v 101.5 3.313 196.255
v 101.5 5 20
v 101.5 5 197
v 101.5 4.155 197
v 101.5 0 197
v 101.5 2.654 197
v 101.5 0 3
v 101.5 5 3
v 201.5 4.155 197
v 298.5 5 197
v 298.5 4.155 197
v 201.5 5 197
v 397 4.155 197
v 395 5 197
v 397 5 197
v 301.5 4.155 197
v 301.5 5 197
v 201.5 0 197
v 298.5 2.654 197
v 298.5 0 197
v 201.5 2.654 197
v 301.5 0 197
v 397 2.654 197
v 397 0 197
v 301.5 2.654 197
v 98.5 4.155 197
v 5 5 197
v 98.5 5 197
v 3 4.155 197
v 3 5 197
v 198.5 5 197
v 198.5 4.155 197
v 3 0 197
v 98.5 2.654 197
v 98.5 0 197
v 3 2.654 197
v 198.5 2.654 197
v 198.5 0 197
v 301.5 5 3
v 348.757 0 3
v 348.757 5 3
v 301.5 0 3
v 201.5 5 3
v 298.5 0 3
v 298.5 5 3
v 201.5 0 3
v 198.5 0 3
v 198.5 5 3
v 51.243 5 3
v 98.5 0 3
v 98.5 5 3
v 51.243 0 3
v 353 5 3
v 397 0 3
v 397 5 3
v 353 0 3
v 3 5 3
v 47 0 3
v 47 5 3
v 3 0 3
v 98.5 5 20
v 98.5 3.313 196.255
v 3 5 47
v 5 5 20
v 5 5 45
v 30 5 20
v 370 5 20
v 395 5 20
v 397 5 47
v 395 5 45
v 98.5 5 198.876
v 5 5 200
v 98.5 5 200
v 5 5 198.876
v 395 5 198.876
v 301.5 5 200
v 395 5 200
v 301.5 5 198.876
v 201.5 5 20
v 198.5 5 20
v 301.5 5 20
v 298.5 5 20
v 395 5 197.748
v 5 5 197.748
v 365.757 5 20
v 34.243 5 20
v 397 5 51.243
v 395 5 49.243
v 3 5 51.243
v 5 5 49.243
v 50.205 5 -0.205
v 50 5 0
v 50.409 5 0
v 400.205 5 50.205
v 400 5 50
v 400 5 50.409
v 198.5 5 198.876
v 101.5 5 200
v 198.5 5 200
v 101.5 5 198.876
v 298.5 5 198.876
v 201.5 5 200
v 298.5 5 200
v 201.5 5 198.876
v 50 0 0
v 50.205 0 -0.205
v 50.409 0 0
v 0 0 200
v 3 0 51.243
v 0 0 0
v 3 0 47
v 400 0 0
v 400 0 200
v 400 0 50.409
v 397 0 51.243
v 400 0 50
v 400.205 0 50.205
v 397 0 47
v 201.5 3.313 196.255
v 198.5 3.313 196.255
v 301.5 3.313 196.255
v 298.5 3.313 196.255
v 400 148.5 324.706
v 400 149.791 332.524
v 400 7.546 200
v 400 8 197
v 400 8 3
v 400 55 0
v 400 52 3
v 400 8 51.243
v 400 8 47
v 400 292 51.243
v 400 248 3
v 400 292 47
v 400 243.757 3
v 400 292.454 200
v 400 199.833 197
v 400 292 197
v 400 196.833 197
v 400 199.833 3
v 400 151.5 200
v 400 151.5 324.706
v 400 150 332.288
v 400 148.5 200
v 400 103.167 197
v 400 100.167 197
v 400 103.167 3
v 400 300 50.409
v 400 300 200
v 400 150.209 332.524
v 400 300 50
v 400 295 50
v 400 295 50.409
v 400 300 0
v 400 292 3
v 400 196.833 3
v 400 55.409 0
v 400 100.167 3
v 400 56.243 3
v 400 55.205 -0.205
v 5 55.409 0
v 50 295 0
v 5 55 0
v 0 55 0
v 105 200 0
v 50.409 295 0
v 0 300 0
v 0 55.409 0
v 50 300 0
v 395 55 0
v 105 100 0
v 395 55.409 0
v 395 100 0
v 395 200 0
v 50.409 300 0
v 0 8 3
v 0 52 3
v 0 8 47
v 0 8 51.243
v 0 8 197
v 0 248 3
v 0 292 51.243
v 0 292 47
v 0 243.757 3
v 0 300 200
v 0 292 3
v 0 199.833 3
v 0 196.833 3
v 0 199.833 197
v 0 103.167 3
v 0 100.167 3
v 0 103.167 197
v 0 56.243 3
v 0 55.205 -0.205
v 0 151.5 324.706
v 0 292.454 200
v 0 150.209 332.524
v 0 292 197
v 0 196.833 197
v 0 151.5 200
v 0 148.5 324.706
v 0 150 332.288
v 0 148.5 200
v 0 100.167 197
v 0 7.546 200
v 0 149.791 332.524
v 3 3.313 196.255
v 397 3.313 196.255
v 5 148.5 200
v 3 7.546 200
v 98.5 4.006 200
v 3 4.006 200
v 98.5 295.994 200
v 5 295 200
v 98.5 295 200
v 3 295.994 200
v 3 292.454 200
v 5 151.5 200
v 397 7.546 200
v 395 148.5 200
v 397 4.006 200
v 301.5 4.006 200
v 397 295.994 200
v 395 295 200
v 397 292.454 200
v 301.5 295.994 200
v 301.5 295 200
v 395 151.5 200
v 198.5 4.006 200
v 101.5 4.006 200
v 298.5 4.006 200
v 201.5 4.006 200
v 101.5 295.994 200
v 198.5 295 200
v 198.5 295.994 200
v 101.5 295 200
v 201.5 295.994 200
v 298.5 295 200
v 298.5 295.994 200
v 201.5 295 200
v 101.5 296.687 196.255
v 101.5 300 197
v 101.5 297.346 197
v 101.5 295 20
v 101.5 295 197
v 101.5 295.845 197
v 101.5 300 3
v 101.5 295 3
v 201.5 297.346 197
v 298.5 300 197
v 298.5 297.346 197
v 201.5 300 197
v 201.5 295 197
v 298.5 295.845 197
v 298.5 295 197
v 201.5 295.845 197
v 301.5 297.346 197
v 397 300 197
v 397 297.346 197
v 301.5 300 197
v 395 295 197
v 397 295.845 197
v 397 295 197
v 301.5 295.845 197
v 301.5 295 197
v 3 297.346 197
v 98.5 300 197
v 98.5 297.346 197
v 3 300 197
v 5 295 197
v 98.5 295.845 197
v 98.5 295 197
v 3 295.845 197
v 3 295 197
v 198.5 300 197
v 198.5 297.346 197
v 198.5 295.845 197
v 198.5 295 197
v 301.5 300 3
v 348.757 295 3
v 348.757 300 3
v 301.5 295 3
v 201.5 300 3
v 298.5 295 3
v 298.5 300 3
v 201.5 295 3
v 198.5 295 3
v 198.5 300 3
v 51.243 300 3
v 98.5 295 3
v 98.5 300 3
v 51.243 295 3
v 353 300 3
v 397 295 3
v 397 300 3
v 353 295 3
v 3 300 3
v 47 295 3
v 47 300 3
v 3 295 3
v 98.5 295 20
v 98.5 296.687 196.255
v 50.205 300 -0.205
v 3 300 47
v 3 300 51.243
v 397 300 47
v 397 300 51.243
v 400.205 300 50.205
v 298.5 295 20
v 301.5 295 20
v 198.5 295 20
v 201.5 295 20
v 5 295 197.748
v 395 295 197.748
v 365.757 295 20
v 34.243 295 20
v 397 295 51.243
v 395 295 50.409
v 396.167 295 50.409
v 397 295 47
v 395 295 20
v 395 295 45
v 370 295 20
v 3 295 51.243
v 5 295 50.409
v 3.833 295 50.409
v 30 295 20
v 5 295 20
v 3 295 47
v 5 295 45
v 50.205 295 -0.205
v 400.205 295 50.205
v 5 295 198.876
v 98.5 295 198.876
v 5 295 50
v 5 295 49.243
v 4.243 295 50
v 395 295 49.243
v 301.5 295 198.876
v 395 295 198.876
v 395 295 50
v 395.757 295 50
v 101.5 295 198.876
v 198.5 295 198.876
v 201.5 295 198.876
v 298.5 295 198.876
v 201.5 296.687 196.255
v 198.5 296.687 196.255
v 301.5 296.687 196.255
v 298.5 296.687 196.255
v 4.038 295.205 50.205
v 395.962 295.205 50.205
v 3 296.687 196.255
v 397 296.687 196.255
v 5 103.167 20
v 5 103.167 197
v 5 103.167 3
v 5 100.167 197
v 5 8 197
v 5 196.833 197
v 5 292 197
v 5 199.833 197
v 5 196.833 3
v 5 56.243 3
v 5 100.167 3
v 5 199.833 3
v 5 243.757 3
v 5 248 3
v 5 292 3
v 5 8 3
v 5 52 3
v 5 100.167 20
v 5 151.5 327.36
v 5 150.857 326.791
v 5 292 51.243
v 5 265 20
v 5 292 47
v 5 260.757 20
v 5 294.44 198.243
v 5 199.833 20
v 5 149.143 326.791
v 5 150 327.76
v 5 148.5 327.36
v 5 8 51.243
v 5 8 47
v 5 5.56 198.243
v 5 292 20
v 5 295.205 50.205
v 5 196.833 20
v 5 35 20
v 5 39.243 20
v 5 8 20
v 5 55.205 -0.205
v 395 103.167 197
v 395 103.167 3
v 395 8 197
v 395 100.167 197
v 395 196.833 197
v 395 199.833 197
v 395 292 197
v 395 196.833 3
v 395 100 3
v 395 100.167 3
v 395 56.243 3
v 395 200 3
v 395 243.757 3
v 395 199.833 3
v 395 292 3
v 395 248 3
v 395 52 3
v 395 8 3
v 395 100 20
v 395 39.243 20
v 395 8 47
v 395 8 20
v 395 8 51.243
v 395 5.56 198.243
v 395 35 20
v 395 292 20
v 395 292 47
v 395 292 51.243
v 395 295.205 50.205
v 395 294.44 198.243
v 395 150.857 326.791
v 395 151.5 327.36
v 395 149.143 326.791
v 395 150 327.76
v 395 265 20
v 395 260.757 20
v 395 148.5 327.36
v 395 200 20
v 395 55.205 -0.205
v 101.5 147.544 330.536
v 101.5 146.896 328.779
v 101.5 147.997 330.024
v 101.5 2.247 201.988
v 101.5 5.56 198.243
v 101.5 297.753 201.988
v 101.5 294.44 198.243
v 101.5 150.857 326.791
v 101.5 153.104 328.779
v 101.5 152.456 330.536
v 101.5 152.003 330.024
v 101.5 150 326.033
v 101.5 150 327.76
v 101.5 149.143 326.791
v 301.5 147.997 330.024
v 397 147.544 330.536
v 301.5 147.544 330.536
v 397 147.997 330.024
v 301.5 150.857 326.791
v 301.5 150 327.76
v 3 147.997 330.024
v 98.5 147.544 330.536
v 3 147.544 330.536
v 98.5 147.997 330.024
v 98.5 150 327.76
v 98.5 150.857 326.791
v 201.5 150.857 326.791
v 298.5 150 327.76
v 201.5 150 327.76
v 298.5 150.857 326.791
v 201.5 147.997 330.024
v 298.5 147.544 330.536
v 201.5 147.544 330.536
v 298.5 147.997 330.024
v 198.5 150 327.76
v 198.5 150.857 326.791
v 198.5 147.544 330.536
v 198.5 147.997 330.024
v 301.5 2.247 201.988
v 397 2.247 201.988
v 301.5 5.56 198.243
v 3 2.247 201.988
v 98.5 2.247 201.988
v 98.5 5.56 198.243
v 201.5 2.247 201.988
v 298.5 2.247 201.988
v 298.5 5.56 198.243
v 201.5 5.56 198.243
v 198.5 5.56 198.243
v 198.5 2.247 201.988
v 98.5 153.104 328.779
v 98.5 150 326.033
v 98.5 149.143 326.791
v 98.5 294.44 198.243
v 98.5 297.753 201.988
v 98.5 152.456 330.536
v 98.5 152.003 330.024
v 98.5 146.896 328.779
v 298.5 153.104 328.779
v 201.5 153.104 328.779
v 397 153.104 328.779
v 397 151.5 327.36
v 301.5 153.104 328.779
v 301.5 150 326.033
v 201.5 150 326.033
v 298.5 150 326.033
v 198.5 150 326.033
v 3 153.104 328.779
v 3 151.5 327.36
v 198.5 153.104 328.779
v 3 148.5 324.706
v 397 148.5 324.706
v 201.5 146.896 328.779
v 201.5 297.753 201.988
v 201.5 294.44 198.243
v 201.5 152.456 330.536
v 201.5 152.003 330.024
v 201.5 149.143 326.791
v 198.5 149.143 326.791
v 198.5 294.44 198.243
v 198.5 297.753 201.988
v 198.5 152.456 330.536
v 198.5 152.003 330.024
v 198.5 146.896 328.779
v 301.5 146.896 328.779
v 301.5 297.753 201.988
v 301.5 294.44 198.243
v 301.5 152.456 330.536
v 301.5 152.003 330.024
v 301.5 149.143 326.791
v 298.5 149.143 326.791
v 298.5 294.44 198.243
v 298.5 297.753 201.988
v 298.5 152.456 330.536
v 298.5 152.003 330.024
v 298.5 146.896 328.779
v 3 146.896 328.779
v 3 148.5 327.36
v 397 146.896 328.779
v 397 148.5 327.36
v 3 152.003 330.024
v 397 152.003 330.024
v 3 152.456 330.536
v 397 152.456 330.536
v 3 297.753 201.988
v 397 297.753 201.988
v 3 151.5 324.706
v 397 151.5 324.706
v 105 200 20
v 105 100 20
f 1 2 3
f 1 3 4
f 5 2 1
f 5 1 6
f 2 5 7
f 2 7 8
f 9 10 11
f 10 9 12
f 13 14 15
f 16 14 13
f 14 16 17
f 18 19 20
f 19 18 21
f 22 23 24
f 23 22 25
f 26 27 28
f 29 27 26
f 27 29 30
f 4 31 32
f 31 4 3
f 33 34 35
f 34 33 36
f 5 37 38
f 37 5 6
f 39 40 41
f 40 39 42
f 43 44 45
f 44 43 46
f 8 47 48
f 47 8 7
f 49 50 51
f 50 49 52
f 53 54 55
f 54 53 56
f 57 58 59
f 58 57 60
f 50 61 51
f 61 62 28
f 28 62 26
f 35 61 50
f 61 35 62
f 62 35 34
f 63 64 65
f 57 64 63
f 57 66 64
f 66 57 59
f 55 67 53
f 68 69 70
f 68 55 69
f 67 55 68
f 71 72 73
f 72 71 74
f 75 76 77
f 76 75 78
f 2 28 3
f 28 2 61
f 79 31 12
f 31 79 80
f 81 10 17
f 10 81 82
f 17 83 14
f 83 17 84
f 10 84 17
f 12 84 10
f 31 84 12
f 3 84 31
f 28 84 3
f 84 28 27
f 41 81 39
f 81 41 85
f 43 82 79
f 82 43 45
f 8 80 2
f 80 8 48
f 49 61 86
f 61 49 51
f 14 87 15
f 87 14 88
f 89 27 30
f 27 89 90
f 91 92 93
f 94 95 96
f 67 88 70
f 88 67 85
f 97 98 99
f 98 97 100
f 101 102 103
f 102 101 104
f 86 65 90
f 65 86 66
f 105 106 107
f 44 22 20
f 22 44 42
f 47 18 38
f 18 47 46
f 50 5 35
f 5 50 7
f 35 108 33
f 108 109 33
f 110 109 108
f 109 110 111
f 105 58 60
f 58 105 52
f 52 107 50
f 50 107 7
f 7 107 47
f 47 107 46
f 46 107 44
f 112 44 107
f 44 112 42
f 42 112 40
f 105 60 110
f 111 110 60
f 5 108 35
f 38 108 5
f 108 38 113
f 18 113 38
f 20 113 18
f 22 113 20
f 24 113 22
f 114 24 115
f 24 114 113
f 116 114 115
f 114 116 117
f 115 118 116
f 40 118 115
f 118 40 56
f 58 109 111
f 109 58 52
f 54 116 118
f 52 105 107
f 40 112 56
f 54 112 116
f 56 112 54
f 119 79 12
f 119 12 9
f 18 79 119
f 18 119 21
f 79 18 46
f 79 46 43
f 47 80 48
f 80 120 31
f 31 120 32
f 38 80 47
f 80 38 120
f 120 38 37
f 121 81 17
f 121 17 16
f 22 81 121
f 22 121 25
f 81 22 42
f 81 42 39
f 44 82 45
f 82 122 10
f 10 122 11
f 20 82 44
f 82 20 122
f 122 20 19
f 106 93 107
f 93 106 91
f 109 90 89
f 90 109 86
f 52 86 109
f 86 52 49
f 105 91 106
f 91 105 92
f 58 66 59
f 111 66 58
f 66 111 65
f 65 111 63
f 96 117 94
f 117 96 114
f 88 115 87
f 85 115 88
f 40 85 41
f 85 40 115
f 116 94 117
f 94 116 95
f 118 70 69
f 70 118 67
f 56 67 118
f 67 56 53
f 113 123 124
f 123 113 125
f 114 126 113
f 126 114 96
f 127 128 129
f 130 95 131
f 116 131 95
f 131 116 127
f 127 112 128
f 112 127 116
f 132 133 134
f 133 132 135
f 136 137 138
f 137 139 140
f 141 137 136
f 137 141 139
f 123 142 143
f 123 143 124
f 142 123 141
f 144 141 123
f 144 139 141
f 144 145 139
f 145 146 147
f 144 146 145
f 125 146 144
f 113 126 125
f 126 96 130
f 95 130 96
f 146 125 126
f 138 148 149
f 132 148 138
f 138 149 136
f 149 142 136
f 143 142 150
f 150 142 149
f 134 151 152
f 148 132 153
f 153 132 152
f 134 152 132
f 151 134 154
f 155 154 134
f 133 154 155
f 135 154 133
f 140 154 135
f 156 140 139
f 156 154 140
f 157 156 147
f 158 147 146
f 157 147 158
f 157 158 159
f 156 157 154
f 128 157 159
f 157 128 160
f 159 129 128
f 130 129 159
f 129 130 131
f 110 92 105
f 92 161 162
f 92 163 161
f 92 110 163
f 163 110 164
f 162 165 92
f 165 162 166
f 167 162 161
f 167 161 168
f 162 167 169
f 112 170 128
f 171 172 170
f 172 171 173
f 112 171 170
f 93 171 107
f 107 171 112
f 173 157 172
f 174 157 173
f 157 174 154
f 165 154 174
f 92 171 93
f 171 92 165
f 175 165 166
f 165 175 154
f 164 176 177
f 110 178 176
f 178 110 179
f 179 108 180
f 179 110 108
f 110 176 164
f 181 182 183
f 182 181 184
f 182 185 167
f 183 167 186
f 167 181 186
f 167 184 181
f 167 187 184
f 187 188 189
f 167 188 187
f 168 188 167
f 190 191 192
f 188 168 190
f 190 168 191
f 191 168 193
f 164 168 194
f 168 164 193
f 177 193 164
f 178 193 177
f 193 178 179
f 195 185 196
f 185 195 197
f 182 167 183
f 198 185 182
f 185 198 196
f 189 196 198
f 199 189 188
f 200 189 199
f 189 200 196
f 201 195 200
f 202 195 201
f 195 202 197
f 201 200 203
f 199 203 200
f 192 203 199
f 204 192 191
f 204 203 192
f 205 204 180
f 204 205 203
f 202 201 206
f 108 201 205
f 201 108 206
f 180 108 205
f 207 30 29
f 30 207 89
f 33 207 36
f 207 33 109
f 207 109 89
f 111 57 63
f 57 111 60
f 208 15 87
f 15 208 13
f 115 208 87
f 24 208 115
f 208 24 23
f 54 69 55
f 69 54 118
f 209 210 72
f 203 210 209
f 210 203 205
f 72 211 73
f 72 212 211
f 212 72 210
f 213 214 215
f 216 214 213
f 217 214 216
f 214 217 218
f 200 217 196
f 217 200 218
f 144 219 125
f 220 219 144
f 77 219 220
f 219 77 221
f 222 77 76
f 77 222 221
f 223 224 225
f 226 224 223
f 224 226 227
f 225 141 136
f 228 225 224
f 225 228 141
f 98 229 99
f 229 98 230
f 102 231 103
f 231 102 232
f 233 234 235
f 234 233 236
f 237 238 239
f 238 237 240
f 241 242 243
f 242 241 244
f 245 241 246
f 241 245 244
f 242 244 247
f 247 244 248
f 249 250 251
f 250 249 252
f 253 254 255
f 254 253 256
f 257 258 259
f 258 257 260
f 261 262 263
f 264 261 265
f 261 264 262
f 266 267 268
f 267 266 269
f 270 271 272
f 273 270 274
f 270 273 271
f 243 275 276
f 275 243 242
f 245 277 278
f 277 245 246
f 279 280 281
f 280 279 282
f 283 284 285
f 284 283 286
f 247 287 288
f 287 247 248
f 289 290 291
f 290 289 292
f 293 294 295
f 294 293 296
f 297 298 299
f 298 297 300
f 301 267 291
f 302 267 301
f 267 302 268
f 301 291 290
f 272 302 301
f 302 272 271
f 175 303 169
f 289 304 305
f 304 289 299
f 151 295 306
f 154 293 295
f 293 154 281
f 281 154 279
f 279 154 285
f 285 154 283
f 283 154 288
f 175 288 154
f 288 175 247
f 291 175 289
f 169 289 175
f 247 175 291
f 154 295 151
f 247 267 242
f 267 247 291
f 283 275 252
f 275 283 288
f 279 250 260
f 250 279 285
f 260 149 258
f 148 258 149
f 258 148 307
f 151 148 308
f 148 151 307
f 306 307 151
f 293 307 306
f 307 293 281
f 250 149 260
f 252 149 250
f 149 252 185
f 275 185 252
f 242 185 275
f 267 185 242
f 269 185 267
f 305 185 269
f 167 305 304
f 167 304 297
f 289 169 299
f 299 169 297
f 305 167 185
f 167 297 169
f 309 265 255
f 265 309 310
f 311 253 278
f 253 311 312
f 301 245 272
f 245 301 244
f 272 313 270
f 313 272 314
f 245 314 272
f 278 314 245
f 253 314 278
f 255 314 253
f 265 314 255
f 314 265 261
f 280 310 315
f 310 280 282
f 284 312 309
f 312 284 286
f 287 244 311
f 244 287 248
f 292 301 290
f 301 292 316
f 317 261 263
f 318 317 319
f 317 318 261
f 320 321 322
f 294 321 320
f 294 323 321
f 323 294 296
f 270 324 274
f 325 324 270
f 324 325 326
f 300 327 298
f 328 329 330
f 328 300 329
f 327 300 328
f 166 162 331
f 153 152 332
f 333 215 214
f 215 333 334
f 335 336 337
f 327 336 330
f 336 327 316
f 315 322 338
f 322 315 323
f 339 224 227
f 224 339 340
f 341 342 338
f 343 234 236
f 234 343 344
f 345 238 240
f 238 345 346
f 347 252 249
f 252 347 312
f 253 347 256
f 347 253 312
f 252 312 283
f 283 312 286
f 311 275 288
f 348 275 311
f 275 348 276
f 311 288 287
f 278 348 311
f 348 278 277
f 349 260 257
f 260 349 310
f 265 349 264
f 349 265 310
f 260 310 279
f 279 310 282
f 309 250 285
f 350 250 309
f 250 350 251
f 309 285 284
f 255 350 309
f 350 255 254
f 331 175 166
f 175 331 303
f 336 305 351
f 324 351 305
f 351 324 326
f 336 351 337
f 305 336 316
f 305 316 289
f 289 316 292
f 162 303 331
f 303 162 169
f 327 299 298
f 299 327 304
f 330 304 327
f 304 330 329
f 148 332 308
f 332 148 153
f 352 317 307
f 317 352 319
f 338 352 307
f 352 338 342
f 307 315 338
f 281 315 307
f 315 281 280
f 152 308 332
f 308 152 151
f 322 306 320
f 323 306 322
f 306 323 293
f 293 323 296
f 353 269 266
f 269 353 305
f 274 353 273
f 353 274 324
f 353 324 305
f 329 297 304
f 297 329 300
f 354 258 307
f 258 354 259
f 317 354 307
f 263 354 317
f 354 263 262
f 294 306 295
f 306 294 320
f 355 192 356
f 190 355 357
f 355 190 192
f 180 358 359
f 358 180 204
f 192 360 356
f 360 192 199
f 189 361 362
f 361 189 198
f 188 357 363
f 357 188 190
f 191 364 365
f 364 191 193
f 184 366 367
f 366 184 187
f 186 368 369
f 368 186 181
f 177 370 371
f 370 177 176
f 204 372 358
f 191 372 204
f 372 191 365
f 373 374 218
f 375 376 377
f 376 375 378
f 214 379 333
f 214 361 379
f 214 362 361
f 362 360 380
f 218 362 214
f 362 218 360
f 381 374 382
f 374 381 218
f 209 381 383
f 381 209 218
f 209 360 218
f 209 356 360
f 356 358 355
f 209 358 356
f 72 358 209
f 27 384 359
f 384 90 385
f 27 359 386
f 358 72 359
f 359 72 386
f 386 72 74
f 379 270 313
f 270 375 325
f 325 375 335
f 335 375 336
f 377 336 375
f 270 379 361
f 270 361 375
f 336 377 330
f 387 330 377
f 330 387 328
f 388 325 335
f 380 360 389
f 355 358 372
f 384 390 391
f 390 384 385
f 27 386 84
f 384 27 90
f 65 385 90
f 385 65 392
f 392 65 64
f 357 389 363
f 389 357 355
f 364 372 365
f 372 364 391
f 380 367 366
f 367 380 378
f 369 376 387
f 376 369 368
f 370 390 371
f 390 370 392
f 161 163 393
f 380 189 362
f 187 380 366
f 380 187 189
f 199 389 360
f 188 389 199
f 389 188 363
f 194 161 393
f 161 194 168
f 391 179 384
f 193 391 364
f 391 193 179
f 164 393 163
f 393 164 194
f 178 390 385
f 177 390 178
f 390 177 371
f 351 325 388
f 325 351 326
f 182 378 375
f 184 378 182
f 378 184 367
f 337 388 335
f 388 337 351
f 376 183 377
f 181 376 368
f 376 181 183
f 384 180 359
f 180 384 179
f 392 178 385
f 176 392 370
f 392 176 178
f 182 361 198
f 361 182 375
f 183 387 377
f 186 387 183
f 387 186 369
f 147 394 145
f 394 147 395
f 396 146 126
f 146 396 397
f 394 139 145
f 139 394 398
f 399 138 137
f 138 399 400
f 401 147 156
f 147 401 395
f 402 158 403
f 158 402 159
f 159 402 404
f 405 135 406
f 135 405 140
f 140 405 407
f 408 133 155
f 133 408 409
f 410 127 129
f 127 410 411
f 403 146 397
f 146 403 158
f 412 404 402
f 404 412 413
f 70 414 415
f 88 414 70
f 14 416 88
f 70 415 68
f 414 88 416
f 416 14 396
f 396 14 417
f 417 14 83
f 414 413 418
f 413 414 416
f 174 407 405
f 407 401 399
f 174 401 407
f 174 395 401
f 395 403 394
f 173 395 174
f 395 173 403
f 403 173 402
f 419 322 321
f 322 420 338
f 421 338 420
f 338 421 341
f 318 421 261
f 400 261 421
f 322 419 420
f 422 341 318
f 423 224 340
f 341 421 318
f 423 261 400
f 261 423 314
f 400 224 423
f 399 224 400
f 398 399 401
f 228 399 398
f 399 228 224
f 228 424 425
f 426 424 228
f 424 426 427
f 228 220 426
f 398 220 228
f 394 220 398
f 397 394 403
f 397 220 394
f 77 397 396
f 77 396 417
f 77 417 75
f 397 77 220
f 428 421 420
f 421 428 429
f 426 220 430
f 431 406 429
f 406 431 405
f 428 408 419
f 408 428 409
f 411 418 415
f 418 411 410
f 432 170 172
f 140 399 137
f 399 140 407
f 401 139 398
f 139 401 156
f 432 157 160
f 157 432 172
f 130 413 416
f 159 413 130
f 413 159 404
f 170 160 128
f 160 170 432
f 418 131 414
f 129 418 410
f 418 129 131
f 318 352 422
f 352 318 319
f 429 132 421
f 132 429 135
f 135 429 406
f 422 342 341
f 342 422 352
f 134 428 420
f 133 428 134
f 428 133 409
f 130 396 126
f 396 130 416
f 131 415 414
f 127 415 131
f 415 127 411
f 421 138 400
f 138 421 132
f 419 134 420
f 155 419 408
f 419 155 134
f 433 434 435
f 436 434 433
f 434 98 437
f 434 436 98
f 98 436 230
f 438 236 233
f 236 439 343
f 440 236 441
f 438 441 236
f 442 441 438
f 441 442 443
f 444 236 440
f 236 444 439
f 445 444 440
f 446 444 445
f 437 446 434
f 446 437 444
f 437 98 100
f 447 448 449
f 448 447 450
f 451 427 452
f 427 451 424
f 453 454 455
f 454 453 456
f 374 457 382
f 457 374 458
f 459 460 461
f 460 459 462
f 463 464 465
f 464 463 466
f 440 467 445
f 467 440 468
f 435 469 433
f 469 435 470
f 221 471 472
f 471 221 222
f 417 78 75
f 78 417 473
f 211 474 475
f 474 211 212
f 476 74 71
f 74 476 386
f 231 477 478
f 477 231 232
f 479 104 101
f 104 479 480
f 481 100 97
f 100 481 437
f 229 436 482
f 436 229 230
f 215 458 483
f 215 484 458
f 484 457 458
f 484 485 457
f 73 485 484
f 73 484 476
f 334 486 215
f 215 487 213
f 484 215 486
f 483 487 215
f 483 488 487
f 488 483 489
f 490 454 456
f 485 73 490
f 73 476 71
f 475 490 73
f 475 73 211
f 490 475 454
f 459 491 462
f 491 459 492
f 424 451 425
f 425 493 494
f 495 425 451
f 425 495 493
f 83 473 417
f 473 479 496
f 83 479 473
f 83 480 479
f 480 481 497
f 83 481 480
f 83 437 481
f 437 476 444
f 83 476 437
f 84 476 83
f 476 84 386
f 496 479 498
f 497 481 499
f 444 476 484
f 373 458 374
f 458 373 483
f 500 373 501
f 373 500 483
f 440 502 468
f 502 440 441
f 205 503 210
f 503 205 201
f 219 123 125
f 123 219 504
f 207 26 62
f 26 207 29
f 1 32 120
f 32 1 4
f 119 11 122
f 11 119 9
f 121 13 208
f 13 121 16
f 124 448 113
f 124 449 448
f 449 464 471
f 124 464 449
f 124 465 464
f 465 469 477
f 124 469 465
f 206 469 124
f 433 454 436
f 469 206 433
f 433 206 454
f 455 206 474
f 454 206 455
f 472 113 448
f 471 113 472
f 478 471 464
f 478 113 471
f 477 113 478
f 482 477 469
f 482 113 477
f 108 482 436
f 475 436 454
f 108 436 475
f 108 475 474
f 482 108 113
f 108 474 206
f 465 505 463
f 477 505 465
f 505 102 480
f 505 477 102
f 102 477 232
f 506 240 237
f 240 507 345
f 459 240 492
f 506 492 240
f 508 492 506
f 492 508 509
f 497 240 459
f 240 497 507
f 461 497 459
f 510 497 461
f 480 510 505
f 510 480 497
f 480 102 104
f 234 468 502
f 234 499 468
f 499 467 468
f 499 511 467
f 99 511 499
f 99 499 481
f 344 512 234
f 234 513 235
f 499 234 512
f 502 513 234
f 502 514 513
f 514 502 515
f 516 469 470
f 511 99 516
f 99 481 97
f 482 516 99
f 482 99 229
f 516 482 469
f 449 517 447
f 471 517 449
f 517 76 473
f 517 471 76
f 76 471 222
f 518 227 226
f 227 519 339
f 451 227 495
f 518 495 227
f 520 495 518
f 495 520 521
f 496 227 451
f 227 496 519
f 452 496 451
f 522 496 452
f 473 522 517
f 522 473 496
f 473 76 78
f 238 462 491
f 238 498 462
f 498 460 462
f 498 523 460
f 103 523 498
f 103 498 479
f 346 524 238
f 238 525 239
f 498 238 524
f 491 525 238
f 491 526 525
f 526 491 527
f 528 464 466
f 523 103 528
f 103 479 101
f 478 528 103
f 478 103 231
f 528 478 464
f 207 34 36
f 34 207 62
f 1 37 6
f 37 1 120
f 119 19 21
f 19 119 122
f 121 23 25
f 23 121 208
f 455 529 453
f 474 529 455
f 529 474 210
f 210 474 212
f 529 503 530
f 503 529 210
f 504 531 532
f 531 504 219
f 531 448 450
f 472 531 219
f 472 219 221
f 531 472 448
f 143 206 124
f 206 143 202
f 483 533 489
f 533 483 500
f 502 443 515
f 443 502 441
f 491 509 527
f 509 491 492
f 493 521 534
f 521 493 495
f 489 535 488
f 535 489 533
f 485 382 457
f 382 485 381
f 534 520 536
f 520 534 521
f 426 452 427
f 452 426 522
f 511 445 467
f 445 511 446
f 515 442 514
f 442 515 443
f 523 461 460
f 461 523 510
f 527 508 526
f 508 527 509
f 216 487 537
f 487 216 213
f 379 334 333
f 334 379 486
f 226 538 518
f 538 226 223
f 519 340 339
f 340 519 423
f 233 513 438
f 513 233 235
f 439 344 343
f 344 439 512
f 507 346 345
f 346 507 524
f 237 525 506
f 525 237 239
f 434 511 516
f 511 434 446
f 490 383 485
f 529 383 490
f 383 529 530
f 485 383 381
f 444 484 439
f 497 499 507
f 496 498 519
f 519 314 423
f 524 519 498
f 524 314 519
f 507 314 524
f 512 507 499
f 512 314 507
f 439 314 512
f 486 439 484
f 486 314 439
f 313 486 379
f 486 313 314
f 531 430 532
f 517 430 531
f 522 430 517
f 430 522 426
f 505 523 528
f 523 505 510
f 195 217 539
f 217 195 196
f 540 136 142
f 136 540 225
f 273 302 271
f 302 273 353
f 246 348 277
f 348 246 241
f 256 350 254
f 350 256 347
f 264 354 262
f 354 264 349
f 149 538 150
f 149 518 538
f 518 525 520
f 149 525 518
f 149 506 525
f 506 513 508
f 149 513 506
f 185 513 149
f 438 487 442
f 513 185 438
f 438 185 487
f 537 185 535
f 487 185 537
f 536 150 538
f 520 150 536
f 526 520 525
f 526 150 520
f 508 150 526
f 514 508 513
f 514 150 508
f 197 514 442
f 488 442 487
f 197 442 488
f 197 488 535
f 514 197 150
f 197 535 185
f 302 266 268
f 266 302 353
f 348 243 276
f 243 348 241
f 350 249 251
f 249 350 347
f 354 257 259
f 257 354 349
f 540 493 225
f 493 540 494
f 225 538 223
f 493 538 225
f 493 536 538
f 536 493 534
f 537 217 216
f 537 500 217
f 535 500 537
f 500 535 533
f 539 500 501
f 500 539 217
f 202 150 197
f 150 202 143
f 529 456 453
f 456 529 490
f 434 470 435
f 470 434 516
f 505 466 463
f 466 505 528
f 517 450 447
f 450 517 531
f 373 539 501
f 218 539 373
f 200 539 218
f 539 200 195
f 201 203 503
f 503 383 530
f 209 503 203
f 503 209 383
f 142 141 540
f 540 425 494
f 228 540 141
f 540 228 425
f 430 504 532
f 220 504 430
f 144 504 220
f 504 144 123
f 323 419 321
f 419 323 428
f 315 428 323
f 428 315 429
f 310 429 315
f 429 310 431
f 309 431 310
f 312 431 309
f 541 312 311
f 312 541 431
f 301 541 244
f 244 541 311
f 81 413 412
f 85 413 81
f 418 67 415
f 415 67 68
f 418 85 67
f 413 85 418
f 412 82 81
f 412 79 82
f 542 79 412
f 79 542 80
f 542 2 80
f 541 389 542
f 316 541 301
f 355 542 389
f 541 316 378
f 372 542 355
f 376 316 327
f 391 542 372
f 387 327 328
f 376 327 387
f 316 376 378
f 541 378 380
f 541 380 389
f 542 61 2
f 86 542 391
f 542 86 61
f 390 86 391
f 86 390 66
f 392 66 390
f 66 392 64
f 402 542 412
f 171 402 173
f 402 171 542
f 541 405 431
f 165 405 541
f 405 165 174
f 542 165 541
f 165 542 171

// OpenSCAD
module post(origin_offset=[0,0,0], direction=[1,0,0]){
  translate(origin_offset) cube(direction);
}

module frame(d=[400, 300, 200], braces=3, include_diagonal=false, include_siding=false){
  post([0, 0, 0], [d.x, 5, 3]);
  post([0, 0, 3], [3, 5, d.z-6]);
  post([d.x-3, 0, 3], [3, 5, d.z-6]);
  post([0, 0, d.z-3], [d.x, 5, 3]);
  brace_distance = d.x/(braces+1);
  for (i = [1:1:braces]) { 
    color ("green") post([(i*brace_distance)-1.5, 0, 3], [3, 5, d.z-6]);
  }
  if(include_diagonal){
    translate([0, 0, 50]) rotate([0,45,0]) cube([71, 5, 3]);
    translate([d.x-50, 0, 0]) rotate([0,-45,0]) cube([71, 5, 3]);
  }
  if(include_siding){
    color("white", 0.3) translate([0,-0.5,0]) cube([d.x, 0.5, d.z]);
  }
}

module roof(d=[400, 300, 200]){
  translate([0,0,d.z]) rotate([-48.5,0,0]) frame(include_siding=false);
  translate(d) rotate([-48.5,0,180]) frame( include_siding=false);
  color ("green") translate([0, d.y/2-1.5, 200]) cube([5, 3, 130]);
  color ("green") translate([d.x-5, d.y/2-1.5, 200]) cube([5, 3, 130]);
}

module beds(d=[400, 300, 20]){
  union(){
  translate ([5,5,0]) cube([d.x-10, d.y/3-5, d.z]);
  translate ([5, d.y/3*2,0]) cube([d.x-10, d.y/3-5, d.z]);
  translate ([5, d.y/3, 0]) cube([d.x/4,d.y/3,d.z]);
  }
}

dim=[400, 300, 200];

frame(dim, include_diagonal=true, include_siding=false);
translate([0, dim.y-5, 0]) frame(dim, include_diagonal=true, include_siding=false);
translate([5, 5, 0]) rotate([0,0,90]) frame([dim.y-10,dim.x,dim.z], 2, true, include_siding=false);
translate([dim.x, 5, 0]) rotate([0,0,90]) frame([dim.y-10,dim.x,dim.z], 2, true, include_siding=false);
roof();

color ("SaddleBrown") beds();
